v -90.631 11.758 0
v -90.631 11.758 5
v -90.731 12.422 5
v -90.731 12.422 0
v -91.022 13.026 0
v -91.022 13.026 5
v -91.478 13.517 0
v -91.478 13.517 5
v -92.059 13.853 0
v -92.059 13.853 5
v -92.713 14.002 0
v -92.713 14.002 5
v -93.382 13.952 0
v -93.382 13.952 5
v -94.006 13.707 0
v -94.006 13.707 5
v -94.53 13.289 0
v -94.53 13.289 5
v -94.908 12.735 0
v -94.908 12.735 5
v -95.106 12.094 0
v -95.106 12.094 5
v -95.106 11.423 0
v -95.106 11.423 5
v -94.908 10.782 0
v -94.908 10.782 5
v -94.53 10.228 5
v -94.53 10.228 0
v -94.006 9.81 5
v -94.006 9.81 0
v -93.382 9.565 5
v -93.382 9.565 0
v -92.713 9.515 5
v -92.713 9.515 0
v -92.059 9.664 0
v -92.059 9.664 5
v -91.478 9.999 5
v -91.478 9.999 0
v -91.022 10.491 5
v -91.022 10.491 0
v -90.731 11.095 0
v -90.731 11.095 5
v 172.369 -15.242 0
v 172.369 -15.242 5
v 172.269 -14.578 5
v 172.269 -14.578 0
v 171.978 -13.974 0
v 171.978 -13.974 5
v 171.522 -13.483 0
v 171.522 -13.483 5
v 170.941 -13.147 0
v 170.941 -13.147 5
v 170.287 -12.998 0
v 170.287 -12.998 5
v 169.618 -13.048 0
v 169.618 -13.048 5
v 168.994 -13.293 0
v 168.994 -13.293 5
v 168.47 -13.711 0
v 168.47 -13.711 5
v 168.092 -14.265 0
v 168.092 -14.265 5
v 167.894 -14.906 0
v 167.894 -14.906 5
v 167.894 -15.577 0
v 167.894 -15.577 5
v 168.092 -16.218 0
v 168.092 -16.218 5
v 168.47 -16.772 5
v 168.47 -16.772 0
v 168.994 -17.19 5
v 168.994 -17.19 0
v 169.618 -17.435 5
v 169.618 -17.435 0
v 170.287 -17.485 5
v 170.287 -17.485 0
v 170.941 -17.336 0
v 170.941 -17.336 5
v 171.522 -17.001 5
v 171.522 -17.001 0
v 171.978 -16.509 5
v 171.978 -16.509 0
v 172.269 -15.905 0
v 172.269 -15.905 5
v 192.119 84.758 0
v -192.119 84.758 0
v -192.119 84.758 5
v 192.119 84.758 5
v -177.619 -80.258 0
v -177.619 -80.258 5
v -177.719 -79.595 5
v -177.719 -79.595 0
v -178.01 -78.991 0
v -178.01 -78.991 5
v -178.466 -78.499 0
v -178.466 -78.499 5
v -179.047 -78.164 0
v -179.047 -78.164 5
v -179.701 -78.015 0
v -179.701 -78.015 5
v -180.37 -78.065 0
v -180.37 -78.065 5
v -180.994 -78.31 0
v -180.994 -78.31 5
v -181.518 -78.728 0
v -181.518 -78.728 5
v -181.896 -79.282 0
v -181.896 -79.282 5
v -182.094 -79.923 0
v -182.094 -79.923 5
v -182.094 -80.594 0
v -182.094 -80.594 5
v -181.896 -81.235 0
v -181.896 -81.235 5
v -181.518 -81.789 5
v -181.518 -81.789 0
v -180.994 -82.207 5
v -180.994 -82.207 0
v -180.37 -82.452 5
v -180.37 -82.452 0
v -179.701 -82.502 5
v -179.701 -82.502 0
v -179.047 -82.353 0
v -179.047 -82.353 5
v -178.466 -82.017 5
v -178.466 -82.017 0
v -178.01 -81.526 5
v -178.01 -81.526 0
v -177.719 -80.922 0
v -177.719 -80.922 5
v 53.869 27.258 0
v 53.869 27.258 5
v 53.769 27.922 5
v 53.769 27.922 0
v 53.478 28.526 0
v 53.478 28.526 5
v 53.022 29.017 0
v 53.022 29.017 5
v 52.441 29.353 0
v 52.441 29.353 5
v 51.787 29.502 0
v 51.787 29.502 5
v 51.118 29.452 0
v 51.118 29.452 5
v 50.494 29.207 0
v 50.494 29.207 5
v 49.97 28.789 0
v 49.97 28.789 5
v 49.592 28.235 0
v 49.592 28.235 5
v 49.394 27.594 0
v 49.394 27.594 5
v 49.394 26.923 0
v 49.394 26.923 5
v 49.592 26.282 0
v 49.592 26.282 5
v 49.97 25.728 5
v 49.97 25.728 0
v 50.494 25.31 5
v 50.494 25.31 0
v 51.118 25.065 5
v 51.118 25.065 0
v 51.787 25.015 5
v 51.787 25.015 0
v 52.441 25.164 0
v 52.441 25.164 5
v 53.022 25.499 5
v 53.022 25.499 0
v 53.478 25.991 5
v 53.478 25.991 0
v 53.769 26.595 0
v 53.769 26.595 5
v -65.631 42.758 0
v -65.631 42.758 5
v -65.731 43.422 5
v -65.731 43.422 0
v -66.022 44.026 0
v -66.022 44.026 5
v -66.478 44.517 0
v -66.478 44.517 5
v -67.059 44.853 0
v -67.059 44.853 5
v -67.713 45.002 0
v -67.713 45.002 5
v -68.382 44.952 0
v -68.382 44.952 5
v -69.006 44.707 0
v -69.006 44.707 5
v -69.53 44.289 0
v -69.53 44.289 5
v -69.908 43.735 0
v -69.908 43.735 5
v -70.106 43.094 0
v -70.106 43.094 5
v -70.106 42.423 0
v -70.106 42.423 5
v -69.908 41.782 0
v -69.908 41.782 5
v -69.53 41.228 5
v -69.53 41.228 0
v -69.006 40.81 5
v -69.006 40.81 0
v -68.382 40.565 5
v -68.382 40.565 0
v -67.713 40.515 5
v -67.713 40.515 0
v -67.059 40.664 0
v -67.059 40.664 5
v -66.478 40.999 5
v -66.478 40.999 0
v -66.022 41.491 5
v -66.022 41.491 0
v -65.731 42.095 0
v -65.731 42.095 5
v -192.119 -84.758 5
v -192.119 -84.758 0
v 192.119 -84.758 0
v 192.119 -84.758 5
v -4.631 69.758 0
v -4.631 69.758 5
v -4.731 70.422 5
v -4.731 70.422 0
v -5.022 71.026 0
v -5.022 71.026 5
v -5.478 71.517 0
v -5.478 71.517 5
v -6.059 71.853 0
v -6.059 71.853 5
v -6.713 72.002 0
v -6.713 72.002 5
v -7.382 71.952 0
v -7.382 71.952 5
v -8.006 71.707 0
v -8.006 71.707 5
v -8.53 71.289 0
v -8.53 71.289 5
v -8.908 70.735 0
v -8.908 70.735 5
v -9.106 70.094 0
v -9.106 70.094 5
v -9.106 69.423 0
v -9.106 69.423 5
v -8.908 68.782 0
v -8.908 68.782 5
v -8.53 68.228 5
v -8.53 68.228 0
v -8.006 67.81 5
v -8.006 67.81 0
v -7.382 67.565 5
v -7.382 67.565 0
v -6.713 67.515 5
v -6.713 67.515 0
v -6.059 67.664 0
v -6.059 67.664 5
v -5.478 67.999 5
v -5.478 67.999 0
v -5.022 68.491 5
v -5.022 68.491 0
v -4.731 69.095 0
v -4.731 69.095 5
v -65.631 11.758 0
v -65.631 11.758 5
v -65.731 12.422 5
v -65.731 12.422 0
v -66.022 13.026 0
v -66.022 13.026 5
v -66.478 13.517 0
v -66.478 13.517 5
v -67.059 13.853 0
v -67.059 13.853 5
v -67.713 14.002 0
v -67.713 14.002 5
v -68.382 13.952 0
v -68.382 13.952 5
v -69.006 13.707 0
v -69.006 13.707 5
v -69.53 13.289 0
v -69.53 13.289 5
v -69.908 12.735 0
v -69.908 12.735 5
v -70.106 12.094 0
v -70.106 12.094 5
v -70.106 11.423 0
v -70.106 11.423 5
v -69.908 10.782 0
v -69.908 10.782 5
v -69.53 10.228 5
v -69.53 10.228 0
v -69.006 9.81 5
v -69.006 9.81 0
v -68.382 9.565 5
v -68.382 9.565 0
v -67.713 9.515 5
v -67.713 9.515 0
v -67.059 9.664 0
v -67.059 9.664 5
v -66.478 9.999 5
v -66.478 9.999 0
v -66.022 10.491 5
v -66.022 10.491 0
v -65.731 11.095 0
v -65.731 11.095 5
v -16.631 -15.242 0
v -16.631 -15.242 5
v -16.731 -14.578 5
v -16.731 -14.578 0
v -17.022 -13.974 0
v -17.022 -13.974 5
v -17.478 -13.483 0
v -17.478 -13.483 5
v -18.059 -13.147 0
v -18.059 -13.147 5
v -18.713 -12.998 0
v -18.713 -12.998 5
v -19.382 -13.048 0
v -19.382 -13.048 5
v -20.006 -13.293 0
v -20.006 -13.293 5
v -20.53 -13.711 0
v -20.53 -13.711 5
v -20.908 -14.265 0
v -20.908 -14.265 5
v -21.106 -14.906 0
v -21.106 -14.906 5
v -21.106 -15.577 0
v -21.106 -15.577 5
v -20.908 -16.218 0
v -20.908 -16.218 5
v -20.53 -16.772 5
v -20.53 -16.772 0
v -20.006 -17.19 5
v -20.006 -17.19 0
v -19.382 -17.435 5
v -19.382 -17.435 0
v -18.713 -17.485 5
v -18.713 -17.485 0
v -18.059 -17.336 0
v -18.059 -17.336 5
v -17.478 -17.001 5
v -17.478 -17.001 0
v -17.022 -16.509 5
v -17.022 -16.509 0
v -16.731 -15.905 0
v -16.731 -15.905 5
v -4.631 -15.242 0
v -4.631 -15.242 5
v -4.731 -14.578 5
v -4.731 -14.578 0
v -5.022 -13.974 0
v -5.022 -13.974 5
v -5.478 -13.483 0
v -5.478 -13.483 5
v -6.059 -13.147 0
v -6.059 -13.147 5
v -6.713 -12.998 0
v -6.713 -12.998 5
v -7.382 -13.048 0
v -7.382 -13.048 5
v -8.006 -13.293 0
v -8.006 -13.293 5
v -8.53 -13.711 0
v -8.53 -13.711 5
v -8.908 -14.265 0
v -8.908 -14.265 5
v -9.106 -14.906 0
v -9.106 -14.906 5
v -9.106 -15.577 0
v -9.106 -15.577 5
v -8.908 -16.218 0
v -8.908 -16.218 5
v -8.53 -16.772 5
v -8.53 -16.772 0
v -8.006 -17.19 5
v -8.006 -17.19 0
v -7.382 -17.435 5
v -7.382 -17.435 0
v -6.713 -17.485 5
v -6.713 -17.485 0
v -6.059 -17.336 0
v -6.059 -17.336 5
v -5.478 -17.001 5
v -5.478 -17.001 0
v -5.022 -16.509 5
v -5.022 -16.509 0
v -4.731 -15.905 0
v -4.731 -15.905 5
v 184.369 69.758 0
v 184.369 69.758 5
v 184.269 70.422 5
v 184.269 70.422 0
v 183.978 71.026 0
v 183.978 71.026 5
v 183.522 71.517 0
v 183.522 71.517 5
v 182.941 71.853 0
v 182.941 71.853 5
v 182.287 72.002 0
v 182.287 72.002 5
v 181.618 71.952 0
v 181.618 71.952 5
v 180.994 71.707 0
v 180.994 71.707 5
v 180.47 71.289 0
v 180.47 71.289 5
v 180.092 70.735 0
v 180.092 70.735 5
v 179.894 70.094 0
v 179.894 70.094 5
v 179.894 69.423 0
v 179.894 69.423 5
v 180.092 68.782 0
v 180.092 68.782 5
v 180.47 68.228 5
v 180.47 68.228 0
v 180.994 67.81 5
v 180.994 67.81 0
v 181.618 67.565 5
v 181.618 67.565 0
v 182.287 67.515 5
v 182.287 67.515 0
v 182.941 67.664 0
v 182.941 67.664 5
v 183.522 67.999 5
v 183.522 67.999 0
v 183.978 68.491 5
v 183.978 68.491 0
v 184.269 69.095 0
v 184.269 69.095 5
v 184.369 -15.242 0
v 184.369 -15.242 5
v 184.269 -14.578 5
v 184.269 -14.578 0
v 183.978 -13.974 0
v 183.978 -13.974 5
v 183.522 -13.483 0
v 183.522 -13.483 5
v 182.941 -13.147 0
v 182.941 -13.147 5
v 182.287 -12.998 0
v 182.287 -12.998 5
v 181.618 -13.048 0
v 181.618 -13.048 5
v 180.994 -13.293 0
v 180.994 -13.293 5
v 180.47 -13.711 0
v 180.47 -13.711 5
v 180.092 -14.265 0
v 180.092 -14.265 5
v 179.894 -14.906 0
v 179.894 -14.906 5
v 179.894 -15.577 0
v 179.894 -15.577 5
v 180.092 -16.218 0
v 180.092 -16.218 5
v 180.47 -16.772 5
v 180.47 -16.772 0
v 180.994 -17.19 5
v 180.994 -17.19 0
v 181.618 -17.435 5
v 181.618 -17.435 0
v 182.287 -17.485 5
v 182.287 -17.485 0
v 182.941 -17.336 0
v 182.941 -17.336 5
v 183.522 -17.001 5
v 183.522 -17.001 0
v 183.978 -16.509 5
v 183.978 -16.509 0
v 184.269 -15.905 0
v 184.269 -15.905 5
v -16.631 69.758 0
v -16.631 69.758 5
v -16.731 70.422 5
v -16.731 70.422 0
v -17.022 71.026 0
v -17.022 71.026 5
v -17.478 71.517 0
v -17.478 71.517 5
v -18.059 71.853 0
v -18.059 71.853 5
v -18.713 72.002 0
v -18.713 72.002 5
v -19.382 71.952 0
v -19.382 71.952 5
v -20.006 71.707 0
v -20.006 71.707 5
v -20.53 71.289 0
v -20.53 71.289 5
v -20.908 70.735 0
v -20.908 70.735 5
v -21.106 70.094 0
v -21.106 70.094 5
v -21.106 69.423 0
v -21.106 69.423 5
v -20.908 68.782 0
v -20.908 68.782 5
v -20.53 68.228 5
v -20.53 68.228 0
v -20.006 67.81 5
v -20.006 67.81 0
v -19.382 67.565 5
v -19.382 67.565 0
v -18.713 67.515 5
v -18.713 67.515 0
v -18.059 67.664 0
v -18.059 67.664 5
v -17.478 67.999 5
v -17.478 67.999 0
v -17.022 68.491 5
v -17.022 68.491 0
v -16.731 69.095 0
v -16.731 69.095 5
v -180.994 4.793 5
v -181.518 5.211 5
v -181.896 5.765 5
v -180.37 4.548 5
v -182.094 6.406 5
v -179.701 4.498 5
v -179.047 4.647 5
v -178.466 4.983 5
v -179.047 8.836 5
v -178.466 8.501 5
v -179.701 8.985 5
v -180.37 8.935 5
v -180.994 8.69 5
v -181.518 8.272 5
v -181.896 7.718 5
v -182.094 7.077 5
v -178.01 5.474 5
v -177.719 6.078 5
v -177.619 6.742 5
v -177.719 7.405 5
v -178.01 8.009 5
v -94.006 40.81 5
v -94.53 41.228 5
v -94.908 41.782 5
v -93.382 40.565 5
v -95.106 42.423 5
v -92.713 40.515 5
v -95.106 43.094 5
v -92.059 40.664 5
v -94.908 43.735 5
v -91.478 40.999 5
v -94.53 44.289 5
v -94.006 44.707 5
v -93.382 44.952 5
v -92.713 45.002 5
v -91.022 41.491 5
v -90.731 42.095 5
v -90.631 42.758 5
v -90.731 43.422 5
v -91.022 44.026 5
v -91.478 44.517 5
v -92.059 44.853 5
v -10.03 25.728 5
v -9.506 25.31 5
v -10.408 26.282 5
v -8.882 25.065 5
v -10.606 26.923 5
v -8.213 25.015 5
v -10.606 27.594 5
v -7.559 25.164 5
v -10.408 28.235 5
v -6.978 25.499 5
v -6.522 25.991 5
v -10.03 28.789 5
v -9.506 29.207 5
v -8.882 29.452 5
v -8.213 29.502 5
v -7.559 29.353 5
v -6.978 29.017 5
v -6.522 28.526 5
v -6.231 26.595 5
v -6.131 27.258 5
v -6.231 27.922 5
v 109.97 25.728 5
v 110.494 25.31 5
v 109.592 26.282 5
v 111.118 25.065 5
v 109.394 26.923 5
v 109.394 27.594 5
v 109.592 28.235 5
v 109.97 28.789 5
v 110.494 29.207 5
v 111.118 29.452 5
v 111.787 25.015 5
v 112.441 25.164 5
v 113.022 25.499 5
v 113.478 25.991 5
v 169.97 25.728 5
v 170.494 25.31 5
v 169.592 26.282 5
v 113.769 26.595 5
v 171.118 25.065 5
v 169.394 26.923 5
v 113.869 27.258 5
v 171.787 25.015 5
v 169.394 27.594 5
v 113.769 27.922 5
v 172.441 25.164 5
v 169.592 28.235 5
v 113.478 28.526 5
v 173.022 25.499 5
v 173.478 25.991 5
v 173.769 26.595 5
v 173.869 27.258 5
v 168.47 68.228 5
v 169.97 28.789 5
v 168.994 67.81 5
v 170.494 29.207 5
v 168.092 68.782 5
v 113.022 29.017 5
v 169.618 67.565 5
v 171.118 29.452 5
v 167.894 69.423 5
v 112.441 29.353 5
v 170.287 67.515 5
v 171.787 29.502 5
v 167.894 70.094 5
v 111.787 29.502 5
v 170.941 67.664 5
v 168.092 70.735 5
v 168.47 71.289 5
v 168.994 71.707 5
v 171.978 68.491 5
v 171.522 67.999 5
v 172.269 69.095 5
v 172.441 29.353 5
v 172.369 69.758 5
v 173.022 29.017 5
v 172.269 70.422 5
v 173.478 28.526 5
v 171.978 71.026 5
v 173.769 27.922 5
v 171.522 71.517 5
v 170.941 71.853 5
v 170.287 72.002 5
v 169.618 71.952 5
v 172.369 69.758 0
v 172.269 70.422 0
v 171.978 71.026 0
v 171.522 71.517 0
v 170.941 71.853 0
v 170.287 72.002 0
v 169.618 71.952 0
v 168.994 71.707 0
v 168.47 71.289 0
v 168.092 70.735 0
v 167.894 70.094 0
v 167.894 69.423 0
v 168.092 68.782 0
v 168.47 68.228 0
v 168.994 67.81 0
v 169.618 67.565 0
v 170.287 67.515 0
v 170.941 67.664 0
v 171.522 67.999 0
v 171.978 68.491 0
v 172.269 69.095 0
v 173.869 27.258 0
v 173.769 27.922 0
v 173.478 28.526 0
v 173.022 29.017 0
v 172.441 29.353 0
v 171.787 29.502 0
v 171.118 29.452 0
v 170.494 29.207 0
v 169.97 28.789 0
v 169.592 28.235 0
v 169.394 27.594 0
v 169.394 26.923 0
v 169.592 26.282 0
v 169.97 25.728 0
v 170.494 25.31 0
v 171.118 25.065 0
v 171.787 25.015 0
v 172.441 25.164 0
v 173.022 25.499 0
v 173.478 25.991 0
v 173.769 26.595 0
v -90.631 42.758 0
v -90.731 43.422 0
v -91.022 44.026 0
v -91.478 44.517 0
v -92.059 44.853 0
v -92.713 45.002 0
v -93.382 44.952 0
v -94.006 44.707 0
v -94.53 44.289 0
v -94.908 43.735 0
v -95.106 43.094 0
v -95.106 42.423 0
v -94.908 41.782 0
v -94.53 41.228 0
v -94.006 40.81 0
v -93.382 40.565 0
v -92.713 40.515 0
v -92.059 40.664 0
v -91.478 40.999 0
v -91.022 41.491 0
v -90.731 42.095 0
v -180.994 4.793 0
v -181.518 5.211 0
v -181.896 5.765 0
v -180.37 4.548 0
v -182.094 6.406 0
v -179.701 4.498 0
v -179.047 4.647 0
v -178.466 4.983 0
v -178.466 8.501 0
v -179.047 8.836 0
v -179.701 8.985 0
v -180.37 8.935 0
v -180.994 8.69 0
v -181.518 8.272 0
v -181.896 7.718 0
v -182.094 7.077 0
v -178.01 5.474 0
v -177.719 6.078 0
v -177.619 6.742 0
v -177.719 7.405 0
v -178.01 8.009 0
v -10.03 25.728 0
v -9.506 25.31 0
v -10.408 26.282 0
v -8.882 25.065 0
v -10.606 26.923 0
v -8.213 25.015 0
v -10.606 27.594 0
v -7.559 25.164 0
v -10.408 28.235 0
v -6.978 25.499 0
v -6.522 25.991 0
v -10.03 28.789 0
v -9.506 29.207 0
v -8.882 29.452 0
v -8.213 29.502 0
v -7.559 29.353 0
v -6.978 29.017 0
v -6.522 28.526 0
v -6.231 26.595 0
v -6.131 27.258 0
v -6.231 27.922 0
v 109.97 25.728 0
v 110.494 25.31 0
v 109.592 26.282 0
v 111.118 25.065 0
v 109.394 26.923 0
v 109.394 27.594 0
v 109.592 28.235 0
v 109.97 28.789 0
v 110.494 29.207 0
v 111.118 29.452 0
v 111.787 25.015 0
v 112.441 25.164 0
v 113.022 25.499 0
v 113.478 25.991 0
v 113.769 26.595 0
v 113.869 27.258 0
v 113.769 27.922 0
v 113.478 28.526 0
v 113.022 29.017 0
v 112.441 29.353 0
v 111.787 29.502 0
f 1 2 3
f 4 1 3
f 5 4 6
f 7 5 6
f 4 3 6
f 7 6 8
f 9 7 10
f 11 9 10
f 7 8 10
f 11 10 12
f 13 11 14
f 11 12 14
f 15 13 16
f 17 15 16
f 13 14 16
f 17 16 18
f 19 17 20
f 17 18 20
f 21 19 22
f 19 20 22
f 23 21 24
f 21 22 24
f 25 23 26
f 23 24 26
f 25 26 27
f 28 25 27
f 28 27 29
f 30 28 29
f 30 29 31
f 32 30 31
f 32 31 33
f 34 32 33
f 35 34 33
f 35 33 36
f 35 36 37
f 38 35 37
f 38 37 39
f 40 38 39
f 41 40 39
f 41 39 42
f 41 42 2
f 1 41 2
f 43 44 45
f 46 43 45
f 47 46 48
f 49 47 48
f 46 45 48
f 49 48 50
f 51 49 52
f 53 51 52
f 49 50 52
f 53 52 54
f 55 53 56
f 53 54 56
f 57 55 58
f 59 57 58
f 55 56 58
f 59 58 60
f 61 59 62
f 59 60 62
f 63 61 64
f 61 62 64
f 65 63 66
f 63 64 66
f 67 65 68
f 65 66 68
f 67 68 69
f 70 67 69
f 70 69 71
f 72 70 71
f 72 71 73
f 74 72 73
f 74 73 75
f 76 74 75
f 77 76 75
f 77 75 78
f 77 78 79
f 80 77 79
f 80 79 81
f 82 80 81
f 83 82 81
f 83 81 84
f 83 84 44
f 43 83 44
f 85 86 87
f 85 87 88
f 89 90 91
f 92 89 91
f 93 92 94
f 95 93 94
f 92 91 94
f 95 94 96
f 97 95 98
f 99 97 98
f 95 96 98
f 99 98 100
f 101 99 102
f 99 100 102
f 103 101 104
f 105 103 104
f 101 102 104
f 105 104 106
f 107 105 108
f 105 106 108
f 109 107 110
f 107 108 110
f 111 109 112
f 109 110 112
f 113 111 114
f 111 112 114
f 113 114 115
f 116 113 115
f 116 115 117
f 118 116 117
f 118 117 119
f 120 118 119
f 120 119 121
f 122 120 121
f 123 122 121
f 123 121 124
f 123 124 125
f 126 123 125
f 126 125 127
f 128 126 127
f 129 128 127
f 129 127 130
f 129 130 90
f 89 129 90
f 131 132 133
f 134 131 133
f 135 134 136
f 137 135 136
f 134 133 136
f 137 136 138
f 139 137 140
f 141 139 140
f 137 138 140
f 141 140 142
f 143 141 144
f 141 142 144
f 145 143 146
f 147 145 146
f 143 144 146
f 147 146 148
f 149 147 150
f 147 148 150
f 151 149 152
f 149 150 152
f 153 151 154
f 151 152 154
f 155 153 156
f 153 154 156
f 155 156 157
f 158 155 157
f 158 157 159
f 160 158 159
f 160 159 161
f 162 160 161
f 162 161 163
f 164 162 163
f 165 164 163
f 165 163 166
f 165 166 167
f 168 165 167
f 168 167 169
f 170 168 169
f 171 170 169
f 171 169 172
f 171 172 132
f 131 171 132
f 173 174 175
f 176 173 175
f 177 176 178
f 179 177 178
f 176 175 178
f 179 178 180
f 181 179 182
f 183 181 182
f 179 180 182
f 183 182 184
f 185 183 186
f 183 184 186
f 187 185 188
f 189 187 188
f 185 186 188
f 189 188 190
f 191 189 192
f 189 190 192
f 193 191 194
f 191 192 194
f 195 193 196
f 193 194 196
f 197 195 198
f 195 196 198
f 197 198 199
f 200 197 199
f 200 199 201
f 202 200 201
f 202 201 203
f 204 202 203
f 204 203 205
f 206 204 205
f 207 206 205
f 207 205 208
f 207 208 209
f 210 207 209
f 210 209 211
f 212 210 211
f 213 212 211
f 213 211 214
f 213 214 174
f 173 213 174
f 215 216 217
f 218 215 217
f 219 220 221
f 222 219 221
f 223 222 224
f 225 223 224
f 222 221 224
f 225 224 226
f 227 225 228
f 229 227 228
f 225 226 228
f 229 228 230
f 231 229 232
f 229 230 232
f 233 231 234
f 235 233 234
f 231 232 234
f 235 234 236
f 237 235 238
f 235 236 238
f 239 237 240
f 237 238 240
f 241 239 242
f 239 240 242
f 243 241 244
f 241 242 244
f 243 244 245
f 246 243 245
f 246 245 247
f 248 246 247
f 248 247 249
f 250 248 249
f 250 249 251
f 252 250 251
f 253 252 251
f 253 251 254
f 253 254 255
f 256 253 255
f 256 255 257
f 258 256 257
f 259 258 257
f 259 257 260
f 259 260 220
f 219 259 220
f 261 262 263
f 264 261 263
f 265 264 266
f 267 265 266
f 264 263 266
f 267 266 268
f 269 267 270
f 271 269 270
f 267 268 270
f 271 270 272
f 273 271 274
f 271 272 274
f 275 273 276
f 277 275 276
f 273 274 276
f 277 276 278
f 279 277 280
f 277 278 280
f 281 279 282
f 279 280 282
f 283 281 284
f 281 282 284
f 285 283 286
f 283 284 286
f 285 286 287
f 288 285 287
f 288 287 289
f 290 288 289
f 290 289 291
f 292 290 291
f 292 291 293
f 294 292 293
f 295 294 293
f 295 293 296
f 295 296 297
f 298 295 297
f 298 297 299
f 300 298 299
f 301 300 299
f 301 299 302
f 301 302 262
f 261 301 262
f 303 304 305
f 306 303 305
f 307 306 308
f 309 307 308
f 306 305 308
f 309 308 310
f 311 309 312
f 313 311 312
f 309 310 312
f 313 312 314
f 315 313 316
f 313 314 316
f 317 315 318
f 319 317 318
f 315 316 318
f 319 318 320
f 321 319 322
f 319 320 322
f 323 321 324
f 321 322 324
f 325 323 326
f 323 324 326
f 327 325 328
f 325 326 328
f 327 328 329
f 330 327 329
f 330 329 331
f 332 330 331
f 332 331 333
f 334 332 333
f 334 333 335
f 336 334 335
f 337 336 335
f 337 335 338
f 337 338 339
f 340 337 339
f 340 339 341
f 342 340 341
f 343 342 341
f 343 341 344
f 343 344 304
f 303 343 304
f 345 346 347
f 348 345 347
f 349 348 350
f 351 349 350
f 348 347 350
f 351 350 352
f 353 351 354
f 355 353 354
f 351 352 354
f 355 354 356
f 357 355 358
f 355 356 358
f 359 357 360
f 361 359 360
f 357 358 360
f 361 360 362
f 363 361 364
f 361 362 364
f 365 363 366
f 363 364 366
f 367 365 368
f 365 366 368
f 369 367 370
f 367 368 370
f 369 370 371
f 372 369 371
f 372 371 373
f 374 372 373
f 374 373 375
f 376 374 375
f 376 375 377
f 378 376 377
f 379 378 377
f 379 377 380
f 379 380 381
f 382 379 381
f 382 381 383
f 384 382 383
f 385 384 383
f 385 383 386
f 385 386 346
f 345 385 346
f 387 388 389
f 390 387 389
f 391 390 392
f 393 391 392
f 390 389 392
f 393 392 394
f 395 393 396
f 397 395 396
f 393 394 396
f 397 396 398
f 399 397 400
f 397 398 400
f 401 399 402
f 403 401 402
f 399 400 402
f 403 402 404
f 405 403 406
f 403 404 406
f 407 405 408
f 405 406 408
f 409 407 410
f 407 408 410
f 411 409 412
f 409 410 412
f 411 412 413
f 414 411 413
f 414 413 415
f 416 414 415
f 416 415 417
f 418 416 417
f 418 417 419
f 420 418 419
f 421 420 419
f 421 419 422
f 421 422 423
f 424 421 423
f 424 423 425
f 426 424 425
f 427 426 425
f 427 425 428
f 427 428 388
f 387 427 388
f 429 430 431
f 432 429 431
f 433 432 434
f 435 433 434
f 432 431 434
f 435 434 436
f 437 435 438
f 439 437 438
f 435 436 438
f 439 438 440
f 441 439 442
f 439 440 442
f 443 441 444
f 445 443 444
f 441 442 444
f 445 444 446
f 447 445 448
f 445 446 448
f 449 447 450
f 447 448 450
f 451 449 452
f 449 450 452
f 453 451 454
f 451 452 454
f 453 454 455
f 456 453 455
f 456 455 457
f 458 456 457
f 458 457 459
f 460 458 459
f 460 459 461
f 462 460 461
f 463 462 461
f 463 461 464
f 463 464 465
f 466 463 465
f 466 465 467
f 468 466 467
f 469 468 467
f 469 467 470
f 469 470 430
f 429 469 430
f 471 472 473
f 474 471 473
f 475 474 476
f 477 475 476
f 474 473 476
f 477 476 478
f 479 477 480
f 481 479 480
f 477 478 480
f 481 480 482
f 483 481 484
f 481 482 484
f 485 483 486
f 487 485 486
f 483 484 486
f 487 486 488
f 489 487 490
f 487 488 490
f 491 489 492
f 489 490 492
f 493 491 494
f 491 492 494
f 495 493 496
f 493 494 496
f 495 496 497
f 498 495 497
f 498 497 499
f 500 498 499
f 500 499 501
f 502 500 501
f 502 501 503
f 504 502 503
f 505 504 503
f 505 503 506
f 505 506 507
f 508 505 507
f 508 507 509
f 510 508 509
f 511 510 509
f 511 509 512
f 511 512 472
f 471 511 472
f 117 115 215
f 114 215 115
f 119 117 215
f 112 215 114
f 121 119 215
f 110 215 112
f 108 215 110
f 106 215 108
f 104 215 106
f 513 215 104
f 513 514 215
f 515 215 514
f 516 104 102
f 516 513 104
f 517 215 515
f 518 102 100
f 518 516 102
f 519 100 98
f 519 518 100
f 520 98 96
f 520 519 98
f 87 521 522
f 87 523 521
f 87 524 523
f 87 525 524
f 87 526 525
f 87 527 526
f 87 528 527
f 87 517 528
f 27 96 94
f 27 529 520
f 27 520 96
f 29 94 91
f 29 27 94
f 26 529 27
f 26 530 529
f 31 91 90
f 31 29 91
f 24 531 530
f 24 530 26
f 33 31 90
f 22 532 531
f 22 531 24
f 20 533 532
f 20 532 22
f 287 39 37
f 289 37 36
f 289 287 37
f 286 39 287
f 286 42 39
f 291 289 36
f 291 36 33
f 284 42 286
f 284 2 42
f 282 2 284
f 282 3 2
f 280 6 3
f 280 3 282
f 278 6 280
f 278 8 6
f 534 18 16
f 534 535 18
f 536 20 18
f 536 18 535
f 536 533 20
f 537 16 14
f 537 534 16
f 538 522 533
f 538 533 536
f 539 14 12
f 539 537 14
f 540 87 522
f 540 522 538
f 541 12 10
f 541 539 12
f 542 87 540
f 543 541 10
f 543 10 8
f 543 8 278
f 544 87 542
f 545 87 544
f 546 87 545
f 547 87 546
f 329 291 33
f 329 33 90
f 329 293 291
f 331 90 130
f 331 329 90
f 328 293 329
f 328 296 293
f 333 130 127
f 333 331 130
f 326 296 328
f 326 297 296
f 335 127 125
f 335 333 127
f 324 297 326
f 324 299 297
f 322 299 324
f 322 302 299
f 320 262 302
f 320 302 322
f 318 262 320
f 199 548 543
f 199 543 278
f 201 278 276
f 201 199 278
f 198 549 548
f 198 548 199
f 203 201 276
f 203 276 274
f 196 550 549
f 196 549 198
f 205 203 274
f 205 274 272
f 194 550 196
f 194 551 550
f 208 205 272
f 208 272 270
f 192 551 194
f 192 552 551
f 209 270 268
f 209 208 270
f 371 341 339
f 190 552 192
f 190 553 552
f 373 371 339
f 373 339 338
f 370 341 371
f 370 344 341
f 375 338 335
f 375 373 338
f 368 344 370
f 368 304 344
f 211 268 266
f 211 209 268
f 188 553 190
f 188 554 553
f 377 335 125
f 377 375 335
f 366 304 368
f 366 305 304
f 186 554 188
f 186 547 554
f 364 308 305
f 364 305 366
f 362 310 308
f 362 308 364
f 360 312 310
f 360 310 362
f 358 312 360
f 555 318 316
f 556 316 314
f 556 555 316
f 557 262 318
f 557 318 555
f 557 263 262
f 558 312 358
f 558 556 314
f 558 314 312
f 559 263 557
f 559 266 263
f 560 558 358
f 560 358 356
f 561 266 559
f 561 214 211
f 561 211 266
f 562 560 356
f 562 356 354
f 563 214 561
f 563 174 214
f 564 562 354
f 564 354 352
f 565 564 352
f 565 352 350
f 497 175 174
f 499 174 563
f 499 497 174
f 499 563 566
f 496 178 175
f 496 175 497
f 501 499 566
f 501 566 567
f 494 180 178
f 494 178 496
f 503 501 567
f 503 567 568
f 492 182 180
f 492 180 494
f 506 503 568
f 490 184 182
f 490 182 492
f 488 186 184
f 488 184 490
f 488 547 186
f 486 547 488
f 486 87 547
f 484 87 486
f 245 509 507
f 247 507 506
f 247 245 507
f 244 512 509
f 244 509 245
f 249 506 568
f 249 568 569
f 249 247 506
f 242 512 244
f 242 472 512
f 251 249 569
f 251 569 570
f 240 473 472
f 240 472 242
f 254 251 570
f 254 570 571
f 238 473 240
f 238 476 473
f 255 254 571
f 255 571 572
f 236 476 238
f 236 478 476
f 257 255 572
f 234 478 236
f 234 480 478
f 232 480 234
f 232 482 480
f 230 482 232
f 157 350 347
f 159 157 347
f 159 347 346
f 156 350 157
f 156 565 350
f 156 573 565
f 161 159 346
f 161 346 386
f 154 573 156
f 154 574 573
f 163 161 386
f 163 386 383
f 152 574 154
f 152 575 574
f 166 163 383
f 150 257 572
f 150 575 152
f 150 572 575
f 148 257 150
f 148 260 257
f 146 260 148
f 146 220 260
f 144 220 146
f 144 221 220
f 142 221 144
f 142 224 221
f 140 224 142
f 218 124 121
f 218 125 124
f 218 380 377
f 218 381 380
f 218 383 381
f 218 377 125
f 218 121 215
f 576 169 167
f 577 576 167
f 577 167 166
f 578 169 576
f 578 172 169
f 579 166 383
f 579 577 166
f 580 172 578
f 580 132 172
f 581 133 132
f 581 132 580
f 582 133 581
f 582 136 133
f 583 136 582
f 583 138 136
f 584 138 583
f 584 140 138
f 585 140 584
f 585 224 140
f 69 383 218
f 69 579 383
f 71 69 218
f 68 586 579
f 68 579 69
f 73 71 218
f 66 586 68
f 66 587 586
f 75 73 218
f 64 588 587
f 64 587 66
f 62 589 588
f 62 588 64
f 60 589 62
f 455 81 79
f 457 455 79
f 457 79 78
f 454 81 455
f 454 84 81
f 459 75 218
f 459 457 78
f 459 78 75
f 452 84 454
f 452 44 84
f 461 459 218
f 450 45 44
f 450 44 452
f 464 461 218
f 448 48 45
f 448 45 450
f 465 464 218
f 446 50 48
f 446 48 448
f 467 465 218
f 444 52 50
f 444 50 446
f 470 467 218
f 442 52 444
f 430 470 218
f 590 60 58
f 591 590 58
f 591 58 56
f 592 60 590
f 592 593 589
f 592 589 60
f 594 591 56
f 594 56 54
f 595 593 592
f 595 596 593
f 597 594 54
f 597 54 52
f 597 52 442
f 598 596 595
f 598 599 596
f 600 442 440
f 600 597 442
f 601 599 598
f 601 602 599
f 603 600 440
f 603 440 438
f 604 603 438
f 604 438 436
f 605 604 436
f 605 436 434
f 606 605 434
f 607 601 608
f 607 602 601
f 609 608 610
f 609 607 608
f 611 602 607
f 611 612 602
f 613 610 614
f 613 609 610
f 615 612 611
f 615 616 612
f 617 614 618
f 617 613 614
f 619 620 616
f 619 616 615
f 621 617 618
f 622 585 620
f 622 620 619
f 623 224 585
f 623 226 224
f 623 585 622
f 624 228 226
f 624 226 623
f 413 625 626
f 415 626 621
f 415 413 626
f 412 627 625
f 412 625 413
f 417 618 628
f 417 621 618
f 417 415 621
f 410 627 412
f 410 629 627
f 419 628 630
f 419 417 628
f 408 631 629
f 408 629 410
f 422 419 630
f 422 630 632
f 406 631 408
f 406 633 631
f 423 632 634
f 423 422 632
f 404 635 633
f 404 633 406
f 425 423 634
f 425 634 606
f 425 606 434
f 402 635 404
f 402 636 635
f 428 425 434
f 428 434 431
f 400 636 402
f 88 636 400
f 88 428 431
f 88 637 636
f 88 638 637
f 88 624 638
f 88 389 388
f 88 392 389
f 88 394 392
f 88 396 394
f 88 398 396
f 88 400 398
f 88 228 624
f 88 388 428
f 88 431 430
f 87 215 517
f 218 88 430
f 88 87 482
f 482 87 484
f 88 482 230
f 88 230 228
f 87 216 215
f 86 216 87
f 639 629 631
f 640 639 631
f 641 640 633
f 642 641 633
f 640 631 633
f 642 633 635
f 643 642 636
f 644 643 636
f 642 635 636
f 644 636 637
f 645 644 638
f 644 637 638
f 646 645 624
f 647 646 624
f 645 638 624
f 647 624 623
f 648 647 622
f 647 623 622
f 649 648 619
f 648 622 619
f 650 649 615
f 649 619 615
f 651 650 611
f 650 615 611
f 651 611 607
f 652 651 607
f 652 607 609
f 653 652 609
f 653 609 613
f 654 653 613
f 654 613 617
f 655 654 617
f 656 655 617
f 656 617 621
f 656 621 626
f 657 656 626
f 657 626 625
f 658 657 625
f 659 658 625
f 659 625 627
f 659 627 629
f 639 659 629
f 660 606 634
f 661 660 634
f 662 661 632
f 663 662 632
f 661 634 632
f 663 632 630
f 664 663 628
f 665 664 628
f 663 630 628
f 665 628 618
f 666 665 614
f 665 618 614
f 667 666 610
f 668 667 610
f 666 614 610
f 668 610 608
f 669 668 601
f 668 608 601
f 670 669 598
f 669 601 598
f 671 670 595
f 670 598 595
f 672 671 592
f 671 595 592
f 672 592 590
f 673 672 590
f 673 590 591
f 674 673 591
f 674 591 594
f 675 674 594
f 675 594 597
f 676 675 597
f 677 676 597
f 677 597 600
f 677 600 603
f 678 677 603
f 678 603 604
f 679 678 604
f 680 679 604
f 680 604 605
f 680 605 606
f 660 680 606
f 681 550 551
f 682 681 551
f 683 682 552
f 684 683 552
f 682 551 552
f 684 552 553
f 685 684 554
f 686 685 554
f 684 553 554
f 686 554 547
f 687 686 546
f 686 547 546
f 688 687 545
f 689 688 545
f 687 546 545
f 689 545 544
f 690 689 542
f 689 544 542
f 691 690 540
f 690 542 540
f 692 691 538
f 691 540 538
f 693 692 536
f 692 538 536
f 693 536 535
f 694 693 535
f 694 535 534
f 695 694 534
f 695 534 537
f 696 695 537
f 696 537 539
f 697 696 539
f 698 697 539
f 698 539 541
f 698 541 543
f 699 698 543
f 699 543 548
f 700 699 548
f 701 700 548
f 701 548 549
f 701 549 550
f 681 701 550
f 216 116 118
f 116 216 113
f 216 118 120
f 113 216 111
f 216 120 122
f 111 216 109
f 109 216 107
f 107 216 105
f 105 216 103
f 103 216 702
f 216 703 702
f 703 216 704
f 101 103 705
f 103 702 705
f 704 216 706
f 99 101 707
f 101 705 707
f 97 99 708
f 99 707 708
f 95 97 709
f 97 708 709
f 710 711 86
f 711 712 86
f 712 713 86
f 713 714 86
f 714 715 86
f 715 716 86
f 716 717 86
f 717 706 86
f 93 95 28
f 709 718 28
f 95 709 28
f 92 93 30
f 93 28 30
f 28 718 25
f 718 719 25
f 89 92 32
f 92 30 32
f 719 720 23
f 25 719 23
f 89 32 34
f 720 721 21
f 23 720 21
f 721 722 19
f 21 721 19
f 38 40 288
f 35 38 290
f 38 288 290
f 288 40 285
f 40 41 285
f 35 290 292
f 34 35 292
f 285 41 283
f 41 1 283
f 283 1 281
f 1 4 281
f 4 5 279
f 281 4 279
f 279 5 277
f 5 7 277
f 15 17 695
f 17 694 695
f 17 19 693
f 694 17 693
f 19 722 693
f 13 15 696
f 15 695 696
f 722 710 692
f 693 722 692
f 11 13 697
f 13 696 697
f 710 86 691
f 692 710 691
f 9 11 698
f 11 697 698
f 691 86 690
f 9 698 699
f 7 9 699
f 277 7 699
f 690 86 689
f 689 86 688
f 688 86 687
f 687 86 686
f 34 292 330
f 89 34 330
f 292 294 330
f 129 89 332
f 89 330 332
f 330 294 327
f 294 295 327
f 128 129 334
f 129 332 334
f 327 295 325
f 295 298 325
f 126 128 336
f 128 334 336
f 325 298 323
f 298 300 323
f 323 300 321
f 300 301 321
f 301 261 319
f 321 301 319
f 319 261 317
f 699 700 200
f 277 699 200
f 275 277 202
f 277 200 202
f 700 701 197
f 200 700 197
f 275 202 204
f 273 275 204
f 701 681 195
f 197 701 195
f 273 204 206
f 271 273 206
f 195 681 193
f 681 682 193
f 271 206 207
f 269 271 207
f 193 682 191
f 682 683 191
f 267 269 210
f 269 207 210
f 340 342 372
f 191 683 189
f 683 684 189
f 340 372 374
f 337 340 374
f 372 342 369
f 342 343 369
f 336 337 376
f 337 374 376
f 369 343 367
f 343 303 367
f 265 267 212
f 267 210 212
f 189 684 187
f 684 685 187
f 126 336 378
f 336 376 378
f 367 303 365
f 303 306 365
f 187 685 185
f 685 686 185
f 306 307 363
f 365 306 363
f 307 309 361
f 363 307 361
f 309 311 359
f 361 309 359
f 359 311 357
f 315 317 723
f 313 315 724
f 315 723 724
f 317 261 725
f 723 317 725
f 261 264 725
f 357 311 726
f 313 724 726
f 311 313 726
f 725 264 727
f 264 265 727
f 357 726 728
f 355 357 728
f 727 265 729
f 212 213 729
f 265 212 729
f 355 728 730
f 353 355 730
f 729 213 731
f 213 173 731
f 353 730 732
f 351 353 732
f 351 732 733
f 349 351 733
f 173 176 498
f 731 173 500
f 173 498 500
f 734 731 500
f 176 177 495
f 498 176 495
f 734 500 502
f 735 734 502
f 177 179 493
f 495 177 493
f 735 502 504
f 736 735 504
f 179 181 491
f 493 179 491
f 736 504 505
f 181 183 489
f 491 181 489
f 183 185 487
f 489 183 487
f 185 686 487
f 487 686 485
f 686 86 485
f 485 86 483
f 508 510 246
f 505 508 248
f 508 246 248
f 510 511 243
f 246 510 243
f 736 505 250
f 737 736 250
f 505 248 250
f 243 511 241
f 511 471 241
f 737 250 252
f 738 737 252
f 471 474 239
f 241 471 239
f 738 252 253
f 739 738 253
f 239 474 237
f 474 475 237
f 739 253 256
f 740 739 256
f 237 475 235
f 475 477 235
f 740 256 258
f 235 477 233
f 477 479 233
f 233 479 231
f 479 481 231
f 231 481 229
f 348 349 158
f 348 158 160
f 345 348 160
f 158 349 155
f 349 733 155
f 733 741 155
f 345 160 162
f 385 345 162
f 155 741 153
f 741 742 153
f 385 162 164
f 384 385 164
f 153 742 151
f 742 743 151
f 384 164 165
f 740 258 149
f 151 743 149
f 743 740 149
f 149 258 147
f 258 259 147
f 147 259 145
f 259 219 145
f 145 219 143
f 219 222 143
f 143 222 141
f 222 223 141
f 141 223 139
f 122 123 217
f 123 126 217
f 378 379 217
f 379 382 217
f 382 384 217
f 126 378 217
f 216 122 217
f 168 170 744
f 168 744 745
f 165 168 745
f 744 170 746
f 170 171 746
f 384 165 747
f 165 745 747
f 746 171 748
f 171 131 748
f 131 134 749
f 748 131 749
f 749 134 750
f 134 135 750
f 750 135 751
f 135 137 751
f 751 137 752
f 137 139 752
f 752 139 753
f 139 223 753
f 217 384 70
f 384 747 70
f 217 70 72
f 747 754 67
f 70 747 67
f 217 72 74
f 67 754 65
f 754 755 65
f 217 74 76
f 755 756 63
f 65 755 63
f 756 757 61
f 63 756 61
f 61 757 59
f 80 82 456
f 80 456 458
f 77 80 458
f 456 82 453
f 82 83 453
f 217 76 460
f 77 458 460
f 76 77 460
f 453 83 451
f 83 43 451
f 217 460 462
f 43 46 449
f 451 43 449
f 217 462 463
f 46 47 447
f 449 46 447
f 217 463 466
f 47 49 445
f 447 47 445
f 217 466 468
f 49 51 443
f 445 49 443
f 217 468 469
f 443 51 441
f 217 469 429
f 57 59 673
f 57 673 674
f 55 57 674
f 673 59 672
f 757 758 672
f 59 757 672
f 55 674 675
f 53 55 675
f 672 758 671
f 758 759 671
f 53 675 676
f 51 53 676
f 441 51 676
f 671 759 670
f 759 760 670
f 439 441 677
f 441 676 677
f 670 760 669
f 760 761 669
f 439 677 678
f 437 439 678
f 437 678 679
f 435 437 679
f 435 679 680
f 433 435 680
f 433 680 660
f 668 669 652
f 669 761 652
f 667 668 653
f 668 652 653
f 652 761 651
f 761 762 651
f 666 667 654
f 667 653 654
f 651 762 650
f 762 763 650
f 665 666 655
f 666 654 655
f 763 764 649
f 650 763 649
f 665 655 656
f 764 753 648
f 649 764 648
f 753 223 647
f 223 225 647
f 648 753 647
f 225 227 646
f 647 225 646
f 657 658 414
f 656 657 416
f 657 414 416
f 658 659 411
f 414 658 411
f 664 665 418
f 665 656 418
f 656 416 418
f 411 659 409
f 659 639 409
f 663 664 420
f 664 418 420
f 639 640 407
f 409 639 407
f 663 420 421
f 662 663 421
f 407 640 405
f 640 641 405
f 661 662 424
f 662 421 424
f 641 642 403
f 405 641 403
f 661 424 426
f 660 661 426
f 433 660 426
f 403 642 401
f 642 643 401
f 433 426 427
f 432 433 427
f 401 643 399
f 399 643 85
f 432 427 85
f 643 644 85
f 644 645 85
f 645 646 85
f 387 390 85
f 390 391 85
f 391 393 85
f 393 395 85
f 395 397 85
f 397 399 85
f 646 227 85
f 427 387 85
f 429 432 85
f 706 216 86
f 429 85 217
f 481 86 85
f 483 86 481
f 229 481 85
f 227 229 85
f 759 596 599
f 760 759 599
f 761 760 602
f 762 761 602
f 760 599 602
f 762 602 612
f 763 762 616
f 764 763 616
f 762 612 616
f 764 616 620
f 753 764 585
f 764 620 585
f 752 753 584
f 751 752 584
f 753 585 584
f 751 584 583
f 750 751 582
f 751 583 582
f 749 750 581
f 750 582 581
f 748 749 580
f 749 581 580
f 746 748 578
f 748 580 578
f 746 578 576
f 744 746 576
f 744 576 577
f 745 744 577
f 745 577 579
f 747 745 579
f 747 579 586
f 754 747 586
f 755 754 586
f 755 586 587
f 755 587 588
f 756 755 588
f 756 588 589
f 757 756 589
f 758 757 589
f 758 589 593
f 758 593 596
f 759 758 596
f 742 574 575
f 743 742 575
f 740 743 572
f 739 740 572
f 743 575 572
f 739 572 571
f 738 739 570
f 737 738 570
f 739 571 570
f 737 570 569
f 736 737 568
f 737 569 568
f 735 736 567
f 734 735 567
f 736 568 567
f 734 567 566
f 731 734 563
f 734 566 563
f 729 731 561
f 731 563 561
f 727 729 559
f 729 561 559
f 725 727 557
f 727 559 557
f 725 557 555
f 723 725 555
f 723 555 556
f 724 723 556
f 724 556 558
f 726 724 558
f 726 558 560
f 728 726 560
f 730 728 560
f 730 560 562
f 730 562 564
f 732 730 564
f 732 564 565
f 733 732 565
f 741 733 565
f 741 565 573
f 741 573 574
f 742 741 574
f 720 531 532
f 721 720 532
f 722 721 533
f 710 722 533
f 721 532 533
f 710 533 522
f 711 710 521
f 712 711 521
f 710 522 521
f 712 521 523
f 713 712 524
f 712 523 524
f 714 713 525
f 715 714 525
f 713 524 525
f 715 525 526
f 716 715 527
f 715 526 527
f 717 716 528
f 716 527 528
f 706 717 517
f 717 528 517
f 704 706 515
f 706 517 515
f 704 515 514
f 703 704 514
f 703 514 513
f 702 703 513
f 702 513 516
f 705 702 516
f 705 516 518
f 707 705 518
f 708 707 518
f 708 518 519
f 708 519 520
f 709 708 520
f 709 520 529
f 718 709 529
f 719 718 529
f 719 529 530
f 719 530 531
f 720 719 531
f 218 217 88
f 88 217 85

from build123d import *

# Parameters (mm, degrees)
SKETCH1_W            = 384.237886752
SKETCH1_H            = 169.516714744
BOSS_EXTRUDE1_DEPTH  = 5
M4_CLEARANCE_HOLE1_D = 4.5
M4_CLEARANCE_HOLE2_D = 4.5


with BuildPart() as part:
    # Sketch1 → Boss-Extrude1 (new body)
    with BuildSketch(Plane.XY):
        Rectangle(SKETCH1_W, SKETCH1_H)
    extrude(amount=BOSS_EXTRUDE1_DEPTH)

    # M4 Clearance Hole1 (through all)
    with Locations(Plane(origin=(0, 0, 0), x_dir=(-1, 0, 0), z_dir=(0, 0, -1))):
        with Locations((92.881056624, 42.758357372), (92.881056624, 11.758357372), (67.881056624, 11.758357372), (67.881056624, 42.758357372), (18.881056624, 69.758357372), (6.881056624, 69.758357372), (8.381056624, 27.258357372), (18.881056624, -15.241642628), (6.881056624, -15.241642628), (-51.618943376, 27.258357372), (-111.618943376, 27.258357372), (-171.618943376, 27.258357372), (-170.118943376, -15.241642628), (-182.118943376, -15.241642628), (-170.118943376, 69.758357372), (-182.118943376, 69.758357372)):
            Hole(M4_CLEARANCE_HOLE1_D / 2)

    # M4 Clearance Hole2 (through all)
    with Locations(Plane(origin=(0, 0, 0), x_dir=(-1, 0, 0), z_dir=(0, 0, -1))):
        with Locations((179.868943376, 6.741642628), (179.868943376, -80.258357372)):
            Hole(M4_CLEARANCE_HOLE2_D / 2)


solid = part.part
